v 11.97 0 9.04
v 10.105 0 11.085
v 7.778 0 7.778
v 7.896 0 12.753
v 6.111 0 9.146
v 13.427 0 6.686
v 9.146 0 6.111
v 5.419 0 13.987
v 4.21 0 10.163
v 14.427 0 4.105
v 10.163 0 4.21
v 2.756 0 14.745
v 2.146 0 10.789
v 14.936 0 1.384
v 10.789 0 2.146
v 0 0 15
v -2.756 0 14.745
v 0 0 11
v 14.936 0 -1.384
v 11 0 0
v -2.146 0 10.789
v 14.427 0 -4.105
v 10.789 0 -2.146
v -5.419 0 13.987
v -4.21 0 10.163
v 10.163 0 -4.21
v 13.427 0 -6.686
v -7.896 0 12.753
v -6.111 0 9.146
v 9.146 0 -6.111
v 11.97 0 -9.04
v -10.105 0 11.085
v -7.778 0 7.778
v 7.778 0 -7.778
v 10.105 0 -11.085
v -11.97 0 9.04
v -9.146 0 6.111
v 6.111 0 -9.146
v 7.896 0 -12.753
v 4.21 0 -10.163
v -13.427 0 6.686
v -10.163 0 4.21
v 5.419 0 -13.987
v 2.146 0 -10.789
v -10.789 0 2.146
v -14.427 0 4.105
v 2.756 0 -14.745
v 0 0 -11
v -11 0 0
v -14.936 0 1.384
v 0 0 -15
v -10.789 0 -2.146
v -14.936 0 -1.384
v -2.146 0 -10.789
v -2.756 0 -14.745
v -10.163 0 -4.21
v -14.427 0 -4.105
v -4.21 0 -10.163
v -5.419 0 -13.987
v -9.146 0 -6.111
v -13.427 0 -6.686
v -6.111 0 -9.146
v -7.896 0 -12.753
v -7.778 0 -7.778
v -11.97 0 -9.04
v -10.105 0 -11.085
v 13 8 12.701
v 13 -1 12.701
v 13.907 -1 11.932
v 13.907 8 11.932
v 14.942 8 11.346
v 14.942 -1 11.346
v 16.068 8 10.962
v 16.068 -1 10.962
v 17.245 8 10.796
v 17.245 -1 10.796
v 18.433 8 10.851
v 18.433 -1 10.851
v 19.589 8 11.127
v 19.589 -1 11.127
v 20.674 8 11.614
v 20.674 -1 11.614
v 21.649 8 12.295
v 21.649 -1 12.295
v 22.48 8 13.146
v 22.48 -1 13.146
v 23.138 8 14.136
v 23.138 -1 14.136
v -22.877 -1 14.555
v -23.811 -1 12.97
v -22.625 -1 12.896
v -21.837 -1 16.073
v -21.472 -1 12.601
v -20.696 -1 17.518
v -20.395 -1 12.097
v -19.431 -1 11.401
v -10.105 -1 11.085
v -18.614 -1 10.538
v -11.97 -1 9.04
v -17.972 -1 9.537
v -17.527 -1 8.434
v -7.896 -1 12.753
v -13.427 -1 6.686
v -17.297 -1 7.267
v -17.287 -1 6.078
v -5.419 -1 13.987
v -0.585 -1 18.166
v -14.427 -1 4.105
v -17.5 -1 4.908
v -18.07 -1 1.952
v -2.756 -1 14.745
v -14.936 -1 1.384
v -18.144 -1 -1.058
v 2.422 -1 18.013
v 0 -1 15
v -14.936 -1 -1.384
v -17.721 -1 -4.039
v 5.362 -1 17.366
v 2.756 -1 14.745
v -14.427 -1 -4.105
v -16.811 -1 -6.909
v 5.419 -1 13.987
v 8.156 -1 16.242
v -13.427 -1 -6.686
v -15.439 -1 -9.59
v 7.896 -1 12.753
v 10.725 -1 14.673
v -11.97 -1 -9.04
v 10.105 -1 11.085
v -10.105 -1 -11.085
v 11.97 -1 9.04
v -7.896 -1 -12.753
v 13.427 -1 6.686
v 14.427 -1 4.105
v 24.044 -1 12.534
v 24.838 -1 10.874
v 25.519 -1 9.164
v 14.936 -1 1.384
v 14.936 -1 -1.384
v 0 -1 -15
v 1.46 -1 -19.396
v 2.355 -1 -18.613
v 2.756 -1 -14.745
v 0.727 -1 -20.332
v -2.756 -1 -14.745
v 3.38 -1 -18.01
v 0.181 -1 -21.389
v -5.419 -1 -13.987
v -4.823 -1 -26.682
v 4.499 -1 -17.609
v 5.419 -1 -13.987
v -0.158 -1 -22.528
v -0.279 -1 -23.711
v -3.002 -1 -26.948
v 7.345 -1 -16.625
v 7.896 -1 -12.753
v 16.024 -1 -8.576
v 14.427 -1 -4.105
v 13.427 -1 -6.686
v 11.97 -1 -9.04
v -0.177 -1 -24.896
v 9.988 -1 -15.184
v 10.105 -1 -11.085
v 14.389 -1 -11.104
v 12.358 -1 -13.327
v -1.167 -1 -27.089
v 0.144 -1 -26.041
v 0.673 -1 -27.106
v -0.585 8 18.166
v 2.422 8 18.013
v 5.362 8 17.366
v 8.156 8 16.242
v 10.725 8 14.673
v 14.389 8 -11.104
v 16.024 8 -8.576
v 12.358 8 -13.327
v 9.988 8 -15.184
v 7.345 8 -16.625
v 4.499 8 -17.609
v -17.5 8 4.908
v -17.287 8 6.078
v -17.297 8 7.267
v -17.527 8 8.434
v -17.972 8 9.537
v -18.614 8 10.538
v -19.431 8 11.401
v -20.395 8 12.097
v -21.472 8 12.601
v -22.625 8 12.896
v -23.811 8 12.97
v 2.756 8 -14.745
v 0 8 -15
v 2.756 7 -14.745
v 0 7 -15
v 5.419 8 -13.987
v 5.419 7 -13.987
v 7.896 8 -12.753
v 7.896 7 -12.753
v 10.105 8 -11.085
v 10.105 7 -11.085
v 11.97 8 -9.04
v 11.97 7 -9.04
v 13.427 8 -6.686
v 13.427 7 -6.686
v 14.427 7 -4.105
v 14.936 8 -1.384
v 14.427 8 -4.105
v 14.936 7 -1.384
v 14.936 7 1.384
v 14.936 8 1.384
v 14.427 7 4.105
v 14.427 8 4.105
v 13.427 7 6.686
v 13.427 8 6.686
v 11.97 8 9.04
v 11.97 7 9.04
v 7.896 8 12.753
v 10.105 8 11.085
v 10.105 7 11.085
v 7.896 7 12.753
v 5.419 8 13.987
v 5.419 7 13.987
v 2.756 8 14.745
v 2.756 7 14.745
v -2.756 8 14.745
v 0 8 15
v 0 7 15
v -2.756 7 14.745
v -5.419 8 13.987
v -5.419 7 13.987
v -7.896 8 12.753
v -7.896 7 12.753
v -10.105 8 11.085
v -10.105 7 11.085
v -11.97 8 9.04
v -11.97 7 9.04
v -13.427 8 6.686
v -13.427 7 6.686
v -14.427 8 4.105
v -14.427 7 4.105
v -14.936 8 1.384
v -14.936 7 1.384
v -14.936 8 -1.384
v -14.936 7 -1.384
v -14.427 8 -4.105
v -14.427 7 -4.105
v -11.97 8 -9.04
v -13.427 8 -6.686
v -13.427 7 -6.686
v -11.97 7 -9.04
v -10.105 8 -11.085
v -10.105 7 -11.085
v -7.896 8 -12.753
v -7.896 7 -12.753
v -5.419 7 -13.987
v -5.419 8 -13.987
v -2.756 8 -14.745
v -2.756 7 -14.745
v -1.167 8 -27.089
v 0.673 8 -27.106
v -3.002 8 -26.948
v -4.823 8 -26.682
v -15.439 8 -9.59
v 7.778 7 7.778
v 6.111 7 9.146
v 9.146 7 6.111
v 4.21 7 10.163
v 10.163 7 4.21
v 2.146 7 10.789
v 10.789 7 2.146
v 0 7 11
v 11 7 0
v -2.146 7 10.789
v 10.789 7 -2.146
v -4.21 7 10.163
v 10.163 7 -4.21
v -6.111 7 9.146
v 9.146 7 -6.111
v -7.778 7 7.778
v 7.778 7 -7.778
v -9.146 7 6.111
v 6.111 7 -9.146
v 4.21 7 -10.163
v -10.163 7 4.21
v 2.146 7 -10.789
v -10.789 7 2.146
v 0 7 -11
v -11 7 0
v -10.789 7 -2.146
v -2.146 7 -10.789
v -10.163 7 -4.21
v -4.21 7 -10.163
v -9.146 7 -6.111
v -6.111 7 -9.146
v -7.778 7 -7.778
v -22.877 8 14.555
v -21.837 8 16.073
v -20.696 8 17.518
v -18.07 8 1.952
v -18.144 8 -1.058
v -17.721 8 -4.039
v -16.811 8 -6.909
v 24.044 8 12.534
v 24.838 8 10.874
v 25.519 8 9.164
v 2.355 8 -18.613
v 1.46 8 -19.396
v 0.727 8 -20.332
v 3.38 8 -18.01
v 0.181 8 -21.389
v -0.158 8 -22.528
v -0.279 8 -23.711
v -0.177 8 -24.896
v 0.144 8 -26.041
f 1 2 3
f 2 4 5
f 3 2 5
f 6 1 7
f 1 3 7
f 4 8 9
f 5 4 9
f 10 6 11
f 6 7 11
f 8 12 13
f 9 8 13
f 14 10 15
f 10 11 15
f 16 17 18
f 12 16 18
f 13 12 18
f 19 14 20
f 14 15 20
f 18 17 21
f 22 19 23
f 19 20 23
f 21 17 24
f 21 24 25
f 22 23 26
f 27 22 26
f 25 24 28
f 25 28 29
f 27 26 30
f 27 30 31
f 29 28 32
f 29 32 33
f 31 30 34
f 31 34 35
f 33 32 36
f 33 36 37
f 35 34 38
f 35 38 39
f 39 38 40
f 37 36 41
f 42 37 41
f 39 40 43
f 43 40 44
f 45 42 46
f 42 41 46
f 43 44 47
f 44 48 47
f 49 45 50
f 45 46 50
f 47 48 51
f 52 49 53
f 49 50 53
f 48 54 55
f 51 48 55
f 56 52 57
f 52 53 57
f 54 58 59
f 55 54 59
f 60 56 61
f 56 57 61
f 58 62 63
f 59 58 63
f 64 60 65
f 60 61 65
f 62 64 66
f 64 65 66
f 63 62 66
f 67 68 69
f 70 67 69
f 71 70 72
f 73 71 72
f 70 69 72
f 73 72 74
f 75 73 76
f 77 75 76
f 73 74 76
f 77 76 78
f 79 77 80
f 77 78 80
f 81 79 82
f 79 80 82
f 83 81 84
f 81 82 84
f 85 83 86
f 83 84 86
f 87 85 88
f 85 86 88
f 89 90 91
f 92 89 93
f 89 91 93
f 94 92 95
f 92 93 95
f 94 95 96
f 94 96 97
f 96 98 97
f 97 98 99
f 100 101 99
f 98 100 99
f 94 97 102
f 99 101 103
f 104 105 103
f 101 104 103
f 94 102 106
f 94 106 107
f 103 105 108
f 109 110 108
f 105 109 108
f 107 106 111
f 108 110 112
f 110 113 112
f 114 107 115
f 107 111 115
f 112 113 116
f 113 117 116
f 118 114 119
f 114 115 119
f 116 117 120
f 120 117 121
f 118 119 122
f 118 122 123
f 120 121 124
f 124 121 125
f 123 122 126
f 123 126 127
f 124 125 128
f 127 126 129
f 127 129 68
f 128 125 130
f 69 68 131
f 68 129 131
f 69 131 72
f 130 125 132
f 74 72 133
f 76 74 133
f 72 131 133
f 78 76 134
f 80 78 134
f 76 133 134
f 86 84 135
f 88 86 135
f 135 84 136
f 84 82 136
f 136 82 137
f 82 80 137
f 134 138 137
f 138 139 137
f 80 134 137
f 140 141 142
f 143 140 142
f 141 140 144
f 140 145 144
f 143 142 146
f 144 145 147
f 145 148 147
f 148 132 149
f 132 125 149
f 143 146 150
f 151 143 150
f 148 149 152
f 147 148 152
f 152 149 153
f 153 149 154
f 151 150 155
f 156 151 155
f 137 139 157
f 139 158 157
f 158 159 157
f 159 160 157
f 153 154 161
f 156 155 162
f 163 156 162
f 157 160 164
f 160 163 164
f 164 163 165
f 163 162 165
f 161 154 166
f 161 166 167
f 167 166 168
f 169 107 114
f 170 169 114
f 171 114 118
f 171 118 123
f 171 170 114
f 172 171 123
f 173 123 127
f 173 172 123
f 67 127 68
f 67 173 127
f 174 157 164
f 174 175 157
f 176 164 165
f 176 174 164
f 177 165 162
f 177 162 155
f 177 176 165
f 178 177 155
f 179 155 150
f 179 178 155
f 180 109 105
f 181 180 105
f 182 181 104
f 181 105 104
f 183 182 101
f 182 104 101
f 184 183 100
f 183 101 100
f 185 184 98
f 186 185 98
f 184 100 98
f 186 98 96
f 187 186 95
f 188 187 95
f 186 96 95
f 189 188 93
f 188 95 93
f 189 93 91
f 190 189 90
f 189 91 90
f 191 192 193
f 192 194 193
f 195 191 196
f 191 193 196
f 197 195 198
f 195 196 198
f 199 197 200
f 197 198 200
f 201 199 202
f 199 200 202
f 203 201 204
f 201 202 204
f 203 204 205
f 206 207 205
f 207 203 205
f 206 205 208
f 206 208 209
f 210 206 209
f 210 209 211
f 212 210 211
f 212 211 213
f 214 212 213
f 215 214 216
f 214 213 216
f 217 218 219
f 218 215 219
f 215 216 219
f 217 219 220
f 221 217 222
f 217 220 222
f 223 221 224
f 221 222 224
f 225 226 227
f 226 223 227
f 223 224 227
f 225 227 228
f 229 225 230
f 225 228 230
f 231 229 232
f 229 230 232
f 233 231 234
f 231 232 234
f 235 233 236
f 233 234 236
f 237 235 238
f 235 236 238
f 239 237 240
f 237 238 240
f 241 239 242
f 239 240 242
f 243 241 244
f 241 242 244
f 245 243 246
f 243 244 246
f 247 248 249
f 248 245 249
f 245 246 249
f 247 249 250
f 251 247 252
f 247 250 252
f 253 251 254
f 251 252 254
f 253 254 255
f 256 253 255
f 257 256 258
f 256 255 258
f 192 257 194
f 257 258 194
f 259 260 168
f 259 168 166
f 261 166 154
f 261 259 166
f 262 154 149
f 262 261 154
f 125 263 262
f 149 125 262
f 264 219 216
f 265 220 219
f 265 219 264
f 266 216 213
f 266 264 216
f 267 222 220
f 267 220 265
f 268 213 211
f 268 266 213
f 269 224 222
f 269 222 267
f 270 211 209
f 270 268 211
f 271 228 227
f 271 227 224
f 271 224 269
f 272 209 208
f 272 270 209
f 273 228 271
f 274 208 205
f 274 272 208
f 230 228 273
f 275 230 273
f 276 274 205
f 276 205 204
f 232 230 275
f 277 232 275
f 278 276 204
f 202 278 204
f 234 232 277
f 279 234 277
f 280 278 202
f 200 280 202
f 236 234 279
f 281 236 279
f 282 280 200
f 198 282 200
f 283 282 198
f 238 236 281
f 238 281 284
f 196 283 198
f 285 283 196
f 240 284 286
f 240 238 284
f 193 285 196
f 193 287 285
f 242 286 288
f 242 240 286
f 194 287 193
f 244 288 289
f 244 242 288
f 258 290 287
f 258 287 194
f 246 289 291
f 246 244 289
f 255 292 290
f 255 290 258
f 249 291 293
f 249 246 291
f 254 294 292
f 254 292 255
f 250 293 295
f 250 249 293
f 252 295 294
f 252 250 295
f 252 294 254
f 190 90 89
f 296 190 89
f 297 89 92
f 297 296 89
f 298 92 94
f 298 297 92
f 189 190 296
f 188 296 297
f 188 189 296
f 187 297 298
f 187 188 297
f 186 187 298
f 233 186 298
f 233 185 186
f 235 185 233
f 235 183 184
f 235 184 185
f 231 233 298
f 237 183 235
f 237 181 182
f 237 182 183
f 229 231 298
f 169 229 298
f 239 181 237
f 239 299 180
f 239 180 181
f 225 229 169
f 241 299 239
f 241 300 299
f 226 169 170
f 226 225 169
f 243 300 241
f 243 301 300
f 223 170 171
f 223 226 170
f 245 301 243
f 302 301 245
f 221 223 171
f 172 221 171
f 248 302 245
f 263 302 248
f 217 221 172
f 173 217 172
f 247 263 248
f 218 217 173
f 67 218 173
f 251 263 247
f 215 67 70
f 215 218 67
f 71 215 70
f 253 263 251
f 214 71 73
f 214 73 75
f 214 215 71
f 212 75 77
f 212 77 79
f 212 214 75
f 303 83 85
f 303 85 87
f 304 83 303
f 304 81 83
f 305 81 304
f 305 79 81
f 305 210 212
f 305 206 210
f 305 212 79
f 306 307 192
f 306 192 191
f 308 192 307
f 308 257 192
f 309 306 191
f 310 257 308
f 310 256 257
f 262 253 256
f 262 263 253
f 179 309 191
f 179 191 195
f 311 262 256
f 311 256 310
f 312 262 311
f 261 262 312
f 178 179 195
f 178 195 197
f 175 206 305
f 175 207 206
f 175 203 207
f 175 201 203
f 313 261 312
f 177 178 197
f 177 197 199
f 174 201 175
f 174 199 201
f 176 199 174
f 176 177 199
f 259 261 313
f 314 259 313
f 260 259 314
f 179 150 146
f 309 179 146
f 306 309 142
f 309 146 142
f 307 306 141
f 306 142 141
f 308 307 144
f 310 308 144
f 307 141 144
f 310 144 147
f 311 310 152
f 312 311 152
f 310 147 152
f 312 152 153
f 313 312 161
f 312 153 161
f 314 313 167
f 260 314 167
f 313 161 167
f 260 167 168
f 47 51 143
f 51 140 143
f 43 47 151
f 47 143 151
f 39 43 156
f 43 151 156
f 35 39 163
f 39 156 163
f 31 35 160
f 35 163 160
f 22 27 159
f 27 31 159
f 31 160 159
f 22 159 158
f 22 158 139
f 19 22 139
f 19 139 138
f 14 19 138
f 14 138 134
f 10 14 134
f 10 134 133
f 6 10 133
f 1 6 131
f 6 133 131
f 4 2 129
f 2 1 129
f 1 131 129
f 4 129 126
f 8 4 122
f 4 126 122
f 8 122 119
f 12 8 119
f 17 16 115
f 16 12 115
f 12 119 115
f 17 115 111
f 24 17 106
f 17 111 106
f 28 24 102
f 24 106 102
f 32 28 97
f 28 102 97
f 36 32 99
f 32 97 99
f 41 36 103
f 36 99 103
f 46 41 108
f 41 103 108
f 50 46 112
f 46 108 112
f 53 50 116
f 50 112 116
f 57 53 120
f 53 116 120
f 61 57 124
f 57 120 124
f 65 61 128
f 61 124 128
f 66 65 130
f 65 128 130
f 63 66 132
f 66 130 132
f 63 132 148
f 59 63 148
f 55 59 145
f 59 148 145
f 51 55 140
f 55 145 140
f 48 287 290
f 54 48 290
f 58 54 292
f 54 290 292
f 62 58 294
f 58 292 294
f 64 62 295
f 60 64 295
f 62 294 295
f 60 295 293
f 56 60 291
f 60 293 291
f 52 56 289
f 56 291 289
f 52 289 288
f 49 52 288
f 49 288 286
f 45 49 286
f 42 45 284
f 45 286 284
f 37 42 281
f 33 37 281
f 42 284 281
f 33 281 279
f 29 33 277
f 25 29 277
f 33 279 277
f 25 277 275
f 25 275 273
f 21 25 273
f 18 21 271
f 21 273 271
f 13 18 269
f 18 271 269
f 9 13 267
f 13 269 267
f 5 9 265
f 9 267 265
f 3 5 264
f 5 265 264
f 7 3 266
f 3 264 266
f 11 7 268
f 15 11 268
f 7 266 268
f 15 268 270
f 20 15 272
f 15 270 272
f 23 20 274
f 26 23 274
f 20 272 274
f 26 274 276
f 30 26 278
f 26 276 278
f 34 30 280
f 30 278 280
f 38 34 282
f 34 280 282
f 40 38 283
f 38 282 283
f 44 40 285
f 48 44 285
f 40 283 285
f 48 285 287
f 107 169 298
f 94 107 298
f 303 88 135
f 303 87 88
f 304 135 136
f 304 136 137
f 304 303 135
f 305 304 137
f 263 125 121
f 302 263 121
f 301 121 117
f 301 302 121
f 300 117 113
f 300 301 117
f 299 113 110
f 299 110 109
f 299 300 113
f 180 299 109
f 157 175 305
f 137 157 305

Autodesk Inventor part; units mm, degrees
ref_plane "YZ Plane" through (0, 0, 0) normal (1, 0, 0) x (0, 1, 0)
sketch "Sketch3" plane through (0, 0, 0) normal (1, 0, 0) x (0, 1, 0)
  line L0 (0, 0) -> (0, -11) construction
  line L1 (0, 0) -> (7, 0) construction
  line L2 (7, 0) -> (7, -11) construction
  line L3 (0, -11) -> (0, -41.91)
  line L4 (0, -41.91) -> (-1.9706, -41.91) construction
  line L5 (0, -11) -> (7, -11)
  line L6 (7, -11) -> (7, -41.91)
  line L7 (0, -41.91) -> (0, -39.6842) construction
  line L8 (0, -41.91) -> (7, -41.91)
  dimension "d7" = 7
  dimension "d8" = 11
  dimension "d9" = 41.91
revolve "Revolution1" add sketch "Sketch3" angle 360 about axis through (0, 0, 0) along (0, 1, 0)
ref_plane "Work Plane2" through (0, 0, 0) normal (-1, 0, 0) x (0, 1, 0)
sketch "Sketch4" plane through (0, 0, 0) normal (-1, 0, 0) x (0, 1, 0)
  line L0 (0, 0) -> (7, 0)
  line L1 (7, 41.91) -> (7, -41.91) projected
  line L2 (7, 0) -> (7, 11)
  line L3 (7, 0) -> (8, 0)
  line L4 (8, 0) -> (8, 15)
  line L5 (8, 15) -> (7, 15)
  line L6 (8, 15) -> (8, 41.91)
  line L7 (8, 41.91) -> (7, 41.91)
  line L8 (0, 0) -> (0, 0.75)
  line L9 (0, 11) -> (0, -11) projected
  line L10 (8, 15) -> (0, 15)
  line L11 (0, 41.91) -> (0, -41.91) projected
  line L12 (0, 15) -> (-1, 15)
  line L13 (-1, 15) -> (-1, 41.91)
  line L14 (-1, 41.91) -> (0, 41.91)
  dimension "d16" = 11
  dimension "d17" = 1
  dimension "d18" = 15
  dimension "d20" = 0.75
  dimension "d21" = 1
ref_plane "Work Plane3" through (0, 3.5, 0) normal (0, 1, 0) x (1, 0, 0)
revolve "Revolution2" add sketch "Sketch4" angle 360 about axis through (0, 0, 0) along (0, 1, 0) contours L12 L13 L14 L11 | L1 L7 L6 L5
sketch "Sketch5" plane through (0, 8, 0) normal (0, 1, 0) x (1, 0, 0)
  circle A0 centre (0, 0) radius 18.175
  circle A1 centre (0, 0) radius 15 projected
  circle A2 centre (0, 0) radius 41.91 projected
  circle A3 centre (0, 0) radius 35.56
  dimension "d22" = 3.175
  dimension "d23" = 6.35
extrude "Extrusion2" cut sketch "Sketch5" against normal through all contours A3
sketch "Sketch6" plane through (0, 8, 0) normal (0, 1, 0) x (1, 0, 0)
  circle A0 centre (0, 0) radius 18.175 projected
  circle A1 centre (0, 0) radius 35.56 projected
  line L0 (16.0245, 8.5759) -> (30.4464, -18.372)
  line L1 (27.5834, -22.4426) -> (17.7246, -4.0211)
  dimension "d26" = 4.445
extrude "Extrusion3" add sketch "Sketch6" against normal up to surface (9 mm away) contours A0 L0 A1 L1 picked at (22.1844, -5.1361)
pattern_circular "Circular Pattern1" count 3 over 360 about axis through (0, 3.5, 0) along (0, -1, 0) of "Extrusion3"
fillet "Fillet1" radius 6.35 3 edges at (-5.3799, 3.5, -17.3605) (17.7246, 3.5, 4.0211) (-12.3447, 3.5, 13.3394)
fillet "Fillet1" radius 3.175 3 edges at (27.5834, 3.5, 22.4426) (-33.2276, 3.5, 12.6666) (5.6442, 3.5, -35.1092)
fillet "Fillet1" radius 3.175 3 edges at (0.6874, 3.5, -35.5534) (-31.1338, 3.5, 17.1814) (30.4464, 3.5, 18.372)
sketch "Sketch7" plane through (0, 0, 0) normal (-1, 0, 0) x (0, 1, 0)
  line L0 (8, -41.91) -> (8, 41.91) projected
  line L1 (-1, -41.91) -> (-1, 41.91) projected
  line L2 (8, -41.91) -> (-1, -41.91) projected
  arc A0 (6.04, -41.91) -> (8, -35.56) centre (-3.2664, -35.56) ccw
  arc A1 (-1, -35.56) -> (0.96, -41.91) centre (10.2664, -35.56) ccw
  line L3 (0.96, -41.91) -> (6.04, -41.91)
  line L4 (-1, -35.56) -> (8, -35.56)
  line L5 (8, -22.57) -> (-1, -22.57) projected
  line L6 (8, -24.1718) -> (8, -35.56) projected
  line L7 (-1, -24.1718) -> (8, -24.1718) projected
  line L8 (-1, -22.57) -> (-1, -24.1718) projected
  line L9 (8, -35.56) -> (8, -35.56) projected
  line L10 (0, 0) -> (11.7377, 0)
  dimension "d36" = 6.35
  dimension "d37" = 5.08
revolve "Revolution3" cut sketch "Sketch7" angle 360 about axis through (0, 0, 0) along (0, 1, 0) contours L2 A0 L0 | A1 L2 L1
fillet "Fillet2" radius 1.5875 4 edges at (41.91, 6.04, 0) (-41.91, 6.04, 0) (-41.91, 0.96, 0) (41.91, 0.96, 0)
sketch "Sketch8" plane through (27.5145, 8, 12.8937) normal (0, 1, 0) x (0.8816766, 0, -0.4718541)
  circle A0 centre (-18.175, 24.3509) radius 19.05
  arc A1 (-27.2625, 8.6109) -> (-12.7058, 7.0183) centre (-18.175, 24.3509) ccw projected
  dimension "d40" = 38.1
sketch "Sketch9" plane through (27.5145, 8, 12.8937) normal (0, 1, 0) x (0.8816766, 0, -0.4718541)
  circle A0 centre (-18.175, 24.3509) radius 27.1145
  circle A1 centre (-18.175, 24.3509) radius 41.91
  circle A2 centre (-18.175, 24.3509) radius 41.91 projected
  dimension "d41" = 54.229
extrude "Extrusion4" cut sketch "Sketch9" against normal blind 25.4
properties part number "Spinner 1"
